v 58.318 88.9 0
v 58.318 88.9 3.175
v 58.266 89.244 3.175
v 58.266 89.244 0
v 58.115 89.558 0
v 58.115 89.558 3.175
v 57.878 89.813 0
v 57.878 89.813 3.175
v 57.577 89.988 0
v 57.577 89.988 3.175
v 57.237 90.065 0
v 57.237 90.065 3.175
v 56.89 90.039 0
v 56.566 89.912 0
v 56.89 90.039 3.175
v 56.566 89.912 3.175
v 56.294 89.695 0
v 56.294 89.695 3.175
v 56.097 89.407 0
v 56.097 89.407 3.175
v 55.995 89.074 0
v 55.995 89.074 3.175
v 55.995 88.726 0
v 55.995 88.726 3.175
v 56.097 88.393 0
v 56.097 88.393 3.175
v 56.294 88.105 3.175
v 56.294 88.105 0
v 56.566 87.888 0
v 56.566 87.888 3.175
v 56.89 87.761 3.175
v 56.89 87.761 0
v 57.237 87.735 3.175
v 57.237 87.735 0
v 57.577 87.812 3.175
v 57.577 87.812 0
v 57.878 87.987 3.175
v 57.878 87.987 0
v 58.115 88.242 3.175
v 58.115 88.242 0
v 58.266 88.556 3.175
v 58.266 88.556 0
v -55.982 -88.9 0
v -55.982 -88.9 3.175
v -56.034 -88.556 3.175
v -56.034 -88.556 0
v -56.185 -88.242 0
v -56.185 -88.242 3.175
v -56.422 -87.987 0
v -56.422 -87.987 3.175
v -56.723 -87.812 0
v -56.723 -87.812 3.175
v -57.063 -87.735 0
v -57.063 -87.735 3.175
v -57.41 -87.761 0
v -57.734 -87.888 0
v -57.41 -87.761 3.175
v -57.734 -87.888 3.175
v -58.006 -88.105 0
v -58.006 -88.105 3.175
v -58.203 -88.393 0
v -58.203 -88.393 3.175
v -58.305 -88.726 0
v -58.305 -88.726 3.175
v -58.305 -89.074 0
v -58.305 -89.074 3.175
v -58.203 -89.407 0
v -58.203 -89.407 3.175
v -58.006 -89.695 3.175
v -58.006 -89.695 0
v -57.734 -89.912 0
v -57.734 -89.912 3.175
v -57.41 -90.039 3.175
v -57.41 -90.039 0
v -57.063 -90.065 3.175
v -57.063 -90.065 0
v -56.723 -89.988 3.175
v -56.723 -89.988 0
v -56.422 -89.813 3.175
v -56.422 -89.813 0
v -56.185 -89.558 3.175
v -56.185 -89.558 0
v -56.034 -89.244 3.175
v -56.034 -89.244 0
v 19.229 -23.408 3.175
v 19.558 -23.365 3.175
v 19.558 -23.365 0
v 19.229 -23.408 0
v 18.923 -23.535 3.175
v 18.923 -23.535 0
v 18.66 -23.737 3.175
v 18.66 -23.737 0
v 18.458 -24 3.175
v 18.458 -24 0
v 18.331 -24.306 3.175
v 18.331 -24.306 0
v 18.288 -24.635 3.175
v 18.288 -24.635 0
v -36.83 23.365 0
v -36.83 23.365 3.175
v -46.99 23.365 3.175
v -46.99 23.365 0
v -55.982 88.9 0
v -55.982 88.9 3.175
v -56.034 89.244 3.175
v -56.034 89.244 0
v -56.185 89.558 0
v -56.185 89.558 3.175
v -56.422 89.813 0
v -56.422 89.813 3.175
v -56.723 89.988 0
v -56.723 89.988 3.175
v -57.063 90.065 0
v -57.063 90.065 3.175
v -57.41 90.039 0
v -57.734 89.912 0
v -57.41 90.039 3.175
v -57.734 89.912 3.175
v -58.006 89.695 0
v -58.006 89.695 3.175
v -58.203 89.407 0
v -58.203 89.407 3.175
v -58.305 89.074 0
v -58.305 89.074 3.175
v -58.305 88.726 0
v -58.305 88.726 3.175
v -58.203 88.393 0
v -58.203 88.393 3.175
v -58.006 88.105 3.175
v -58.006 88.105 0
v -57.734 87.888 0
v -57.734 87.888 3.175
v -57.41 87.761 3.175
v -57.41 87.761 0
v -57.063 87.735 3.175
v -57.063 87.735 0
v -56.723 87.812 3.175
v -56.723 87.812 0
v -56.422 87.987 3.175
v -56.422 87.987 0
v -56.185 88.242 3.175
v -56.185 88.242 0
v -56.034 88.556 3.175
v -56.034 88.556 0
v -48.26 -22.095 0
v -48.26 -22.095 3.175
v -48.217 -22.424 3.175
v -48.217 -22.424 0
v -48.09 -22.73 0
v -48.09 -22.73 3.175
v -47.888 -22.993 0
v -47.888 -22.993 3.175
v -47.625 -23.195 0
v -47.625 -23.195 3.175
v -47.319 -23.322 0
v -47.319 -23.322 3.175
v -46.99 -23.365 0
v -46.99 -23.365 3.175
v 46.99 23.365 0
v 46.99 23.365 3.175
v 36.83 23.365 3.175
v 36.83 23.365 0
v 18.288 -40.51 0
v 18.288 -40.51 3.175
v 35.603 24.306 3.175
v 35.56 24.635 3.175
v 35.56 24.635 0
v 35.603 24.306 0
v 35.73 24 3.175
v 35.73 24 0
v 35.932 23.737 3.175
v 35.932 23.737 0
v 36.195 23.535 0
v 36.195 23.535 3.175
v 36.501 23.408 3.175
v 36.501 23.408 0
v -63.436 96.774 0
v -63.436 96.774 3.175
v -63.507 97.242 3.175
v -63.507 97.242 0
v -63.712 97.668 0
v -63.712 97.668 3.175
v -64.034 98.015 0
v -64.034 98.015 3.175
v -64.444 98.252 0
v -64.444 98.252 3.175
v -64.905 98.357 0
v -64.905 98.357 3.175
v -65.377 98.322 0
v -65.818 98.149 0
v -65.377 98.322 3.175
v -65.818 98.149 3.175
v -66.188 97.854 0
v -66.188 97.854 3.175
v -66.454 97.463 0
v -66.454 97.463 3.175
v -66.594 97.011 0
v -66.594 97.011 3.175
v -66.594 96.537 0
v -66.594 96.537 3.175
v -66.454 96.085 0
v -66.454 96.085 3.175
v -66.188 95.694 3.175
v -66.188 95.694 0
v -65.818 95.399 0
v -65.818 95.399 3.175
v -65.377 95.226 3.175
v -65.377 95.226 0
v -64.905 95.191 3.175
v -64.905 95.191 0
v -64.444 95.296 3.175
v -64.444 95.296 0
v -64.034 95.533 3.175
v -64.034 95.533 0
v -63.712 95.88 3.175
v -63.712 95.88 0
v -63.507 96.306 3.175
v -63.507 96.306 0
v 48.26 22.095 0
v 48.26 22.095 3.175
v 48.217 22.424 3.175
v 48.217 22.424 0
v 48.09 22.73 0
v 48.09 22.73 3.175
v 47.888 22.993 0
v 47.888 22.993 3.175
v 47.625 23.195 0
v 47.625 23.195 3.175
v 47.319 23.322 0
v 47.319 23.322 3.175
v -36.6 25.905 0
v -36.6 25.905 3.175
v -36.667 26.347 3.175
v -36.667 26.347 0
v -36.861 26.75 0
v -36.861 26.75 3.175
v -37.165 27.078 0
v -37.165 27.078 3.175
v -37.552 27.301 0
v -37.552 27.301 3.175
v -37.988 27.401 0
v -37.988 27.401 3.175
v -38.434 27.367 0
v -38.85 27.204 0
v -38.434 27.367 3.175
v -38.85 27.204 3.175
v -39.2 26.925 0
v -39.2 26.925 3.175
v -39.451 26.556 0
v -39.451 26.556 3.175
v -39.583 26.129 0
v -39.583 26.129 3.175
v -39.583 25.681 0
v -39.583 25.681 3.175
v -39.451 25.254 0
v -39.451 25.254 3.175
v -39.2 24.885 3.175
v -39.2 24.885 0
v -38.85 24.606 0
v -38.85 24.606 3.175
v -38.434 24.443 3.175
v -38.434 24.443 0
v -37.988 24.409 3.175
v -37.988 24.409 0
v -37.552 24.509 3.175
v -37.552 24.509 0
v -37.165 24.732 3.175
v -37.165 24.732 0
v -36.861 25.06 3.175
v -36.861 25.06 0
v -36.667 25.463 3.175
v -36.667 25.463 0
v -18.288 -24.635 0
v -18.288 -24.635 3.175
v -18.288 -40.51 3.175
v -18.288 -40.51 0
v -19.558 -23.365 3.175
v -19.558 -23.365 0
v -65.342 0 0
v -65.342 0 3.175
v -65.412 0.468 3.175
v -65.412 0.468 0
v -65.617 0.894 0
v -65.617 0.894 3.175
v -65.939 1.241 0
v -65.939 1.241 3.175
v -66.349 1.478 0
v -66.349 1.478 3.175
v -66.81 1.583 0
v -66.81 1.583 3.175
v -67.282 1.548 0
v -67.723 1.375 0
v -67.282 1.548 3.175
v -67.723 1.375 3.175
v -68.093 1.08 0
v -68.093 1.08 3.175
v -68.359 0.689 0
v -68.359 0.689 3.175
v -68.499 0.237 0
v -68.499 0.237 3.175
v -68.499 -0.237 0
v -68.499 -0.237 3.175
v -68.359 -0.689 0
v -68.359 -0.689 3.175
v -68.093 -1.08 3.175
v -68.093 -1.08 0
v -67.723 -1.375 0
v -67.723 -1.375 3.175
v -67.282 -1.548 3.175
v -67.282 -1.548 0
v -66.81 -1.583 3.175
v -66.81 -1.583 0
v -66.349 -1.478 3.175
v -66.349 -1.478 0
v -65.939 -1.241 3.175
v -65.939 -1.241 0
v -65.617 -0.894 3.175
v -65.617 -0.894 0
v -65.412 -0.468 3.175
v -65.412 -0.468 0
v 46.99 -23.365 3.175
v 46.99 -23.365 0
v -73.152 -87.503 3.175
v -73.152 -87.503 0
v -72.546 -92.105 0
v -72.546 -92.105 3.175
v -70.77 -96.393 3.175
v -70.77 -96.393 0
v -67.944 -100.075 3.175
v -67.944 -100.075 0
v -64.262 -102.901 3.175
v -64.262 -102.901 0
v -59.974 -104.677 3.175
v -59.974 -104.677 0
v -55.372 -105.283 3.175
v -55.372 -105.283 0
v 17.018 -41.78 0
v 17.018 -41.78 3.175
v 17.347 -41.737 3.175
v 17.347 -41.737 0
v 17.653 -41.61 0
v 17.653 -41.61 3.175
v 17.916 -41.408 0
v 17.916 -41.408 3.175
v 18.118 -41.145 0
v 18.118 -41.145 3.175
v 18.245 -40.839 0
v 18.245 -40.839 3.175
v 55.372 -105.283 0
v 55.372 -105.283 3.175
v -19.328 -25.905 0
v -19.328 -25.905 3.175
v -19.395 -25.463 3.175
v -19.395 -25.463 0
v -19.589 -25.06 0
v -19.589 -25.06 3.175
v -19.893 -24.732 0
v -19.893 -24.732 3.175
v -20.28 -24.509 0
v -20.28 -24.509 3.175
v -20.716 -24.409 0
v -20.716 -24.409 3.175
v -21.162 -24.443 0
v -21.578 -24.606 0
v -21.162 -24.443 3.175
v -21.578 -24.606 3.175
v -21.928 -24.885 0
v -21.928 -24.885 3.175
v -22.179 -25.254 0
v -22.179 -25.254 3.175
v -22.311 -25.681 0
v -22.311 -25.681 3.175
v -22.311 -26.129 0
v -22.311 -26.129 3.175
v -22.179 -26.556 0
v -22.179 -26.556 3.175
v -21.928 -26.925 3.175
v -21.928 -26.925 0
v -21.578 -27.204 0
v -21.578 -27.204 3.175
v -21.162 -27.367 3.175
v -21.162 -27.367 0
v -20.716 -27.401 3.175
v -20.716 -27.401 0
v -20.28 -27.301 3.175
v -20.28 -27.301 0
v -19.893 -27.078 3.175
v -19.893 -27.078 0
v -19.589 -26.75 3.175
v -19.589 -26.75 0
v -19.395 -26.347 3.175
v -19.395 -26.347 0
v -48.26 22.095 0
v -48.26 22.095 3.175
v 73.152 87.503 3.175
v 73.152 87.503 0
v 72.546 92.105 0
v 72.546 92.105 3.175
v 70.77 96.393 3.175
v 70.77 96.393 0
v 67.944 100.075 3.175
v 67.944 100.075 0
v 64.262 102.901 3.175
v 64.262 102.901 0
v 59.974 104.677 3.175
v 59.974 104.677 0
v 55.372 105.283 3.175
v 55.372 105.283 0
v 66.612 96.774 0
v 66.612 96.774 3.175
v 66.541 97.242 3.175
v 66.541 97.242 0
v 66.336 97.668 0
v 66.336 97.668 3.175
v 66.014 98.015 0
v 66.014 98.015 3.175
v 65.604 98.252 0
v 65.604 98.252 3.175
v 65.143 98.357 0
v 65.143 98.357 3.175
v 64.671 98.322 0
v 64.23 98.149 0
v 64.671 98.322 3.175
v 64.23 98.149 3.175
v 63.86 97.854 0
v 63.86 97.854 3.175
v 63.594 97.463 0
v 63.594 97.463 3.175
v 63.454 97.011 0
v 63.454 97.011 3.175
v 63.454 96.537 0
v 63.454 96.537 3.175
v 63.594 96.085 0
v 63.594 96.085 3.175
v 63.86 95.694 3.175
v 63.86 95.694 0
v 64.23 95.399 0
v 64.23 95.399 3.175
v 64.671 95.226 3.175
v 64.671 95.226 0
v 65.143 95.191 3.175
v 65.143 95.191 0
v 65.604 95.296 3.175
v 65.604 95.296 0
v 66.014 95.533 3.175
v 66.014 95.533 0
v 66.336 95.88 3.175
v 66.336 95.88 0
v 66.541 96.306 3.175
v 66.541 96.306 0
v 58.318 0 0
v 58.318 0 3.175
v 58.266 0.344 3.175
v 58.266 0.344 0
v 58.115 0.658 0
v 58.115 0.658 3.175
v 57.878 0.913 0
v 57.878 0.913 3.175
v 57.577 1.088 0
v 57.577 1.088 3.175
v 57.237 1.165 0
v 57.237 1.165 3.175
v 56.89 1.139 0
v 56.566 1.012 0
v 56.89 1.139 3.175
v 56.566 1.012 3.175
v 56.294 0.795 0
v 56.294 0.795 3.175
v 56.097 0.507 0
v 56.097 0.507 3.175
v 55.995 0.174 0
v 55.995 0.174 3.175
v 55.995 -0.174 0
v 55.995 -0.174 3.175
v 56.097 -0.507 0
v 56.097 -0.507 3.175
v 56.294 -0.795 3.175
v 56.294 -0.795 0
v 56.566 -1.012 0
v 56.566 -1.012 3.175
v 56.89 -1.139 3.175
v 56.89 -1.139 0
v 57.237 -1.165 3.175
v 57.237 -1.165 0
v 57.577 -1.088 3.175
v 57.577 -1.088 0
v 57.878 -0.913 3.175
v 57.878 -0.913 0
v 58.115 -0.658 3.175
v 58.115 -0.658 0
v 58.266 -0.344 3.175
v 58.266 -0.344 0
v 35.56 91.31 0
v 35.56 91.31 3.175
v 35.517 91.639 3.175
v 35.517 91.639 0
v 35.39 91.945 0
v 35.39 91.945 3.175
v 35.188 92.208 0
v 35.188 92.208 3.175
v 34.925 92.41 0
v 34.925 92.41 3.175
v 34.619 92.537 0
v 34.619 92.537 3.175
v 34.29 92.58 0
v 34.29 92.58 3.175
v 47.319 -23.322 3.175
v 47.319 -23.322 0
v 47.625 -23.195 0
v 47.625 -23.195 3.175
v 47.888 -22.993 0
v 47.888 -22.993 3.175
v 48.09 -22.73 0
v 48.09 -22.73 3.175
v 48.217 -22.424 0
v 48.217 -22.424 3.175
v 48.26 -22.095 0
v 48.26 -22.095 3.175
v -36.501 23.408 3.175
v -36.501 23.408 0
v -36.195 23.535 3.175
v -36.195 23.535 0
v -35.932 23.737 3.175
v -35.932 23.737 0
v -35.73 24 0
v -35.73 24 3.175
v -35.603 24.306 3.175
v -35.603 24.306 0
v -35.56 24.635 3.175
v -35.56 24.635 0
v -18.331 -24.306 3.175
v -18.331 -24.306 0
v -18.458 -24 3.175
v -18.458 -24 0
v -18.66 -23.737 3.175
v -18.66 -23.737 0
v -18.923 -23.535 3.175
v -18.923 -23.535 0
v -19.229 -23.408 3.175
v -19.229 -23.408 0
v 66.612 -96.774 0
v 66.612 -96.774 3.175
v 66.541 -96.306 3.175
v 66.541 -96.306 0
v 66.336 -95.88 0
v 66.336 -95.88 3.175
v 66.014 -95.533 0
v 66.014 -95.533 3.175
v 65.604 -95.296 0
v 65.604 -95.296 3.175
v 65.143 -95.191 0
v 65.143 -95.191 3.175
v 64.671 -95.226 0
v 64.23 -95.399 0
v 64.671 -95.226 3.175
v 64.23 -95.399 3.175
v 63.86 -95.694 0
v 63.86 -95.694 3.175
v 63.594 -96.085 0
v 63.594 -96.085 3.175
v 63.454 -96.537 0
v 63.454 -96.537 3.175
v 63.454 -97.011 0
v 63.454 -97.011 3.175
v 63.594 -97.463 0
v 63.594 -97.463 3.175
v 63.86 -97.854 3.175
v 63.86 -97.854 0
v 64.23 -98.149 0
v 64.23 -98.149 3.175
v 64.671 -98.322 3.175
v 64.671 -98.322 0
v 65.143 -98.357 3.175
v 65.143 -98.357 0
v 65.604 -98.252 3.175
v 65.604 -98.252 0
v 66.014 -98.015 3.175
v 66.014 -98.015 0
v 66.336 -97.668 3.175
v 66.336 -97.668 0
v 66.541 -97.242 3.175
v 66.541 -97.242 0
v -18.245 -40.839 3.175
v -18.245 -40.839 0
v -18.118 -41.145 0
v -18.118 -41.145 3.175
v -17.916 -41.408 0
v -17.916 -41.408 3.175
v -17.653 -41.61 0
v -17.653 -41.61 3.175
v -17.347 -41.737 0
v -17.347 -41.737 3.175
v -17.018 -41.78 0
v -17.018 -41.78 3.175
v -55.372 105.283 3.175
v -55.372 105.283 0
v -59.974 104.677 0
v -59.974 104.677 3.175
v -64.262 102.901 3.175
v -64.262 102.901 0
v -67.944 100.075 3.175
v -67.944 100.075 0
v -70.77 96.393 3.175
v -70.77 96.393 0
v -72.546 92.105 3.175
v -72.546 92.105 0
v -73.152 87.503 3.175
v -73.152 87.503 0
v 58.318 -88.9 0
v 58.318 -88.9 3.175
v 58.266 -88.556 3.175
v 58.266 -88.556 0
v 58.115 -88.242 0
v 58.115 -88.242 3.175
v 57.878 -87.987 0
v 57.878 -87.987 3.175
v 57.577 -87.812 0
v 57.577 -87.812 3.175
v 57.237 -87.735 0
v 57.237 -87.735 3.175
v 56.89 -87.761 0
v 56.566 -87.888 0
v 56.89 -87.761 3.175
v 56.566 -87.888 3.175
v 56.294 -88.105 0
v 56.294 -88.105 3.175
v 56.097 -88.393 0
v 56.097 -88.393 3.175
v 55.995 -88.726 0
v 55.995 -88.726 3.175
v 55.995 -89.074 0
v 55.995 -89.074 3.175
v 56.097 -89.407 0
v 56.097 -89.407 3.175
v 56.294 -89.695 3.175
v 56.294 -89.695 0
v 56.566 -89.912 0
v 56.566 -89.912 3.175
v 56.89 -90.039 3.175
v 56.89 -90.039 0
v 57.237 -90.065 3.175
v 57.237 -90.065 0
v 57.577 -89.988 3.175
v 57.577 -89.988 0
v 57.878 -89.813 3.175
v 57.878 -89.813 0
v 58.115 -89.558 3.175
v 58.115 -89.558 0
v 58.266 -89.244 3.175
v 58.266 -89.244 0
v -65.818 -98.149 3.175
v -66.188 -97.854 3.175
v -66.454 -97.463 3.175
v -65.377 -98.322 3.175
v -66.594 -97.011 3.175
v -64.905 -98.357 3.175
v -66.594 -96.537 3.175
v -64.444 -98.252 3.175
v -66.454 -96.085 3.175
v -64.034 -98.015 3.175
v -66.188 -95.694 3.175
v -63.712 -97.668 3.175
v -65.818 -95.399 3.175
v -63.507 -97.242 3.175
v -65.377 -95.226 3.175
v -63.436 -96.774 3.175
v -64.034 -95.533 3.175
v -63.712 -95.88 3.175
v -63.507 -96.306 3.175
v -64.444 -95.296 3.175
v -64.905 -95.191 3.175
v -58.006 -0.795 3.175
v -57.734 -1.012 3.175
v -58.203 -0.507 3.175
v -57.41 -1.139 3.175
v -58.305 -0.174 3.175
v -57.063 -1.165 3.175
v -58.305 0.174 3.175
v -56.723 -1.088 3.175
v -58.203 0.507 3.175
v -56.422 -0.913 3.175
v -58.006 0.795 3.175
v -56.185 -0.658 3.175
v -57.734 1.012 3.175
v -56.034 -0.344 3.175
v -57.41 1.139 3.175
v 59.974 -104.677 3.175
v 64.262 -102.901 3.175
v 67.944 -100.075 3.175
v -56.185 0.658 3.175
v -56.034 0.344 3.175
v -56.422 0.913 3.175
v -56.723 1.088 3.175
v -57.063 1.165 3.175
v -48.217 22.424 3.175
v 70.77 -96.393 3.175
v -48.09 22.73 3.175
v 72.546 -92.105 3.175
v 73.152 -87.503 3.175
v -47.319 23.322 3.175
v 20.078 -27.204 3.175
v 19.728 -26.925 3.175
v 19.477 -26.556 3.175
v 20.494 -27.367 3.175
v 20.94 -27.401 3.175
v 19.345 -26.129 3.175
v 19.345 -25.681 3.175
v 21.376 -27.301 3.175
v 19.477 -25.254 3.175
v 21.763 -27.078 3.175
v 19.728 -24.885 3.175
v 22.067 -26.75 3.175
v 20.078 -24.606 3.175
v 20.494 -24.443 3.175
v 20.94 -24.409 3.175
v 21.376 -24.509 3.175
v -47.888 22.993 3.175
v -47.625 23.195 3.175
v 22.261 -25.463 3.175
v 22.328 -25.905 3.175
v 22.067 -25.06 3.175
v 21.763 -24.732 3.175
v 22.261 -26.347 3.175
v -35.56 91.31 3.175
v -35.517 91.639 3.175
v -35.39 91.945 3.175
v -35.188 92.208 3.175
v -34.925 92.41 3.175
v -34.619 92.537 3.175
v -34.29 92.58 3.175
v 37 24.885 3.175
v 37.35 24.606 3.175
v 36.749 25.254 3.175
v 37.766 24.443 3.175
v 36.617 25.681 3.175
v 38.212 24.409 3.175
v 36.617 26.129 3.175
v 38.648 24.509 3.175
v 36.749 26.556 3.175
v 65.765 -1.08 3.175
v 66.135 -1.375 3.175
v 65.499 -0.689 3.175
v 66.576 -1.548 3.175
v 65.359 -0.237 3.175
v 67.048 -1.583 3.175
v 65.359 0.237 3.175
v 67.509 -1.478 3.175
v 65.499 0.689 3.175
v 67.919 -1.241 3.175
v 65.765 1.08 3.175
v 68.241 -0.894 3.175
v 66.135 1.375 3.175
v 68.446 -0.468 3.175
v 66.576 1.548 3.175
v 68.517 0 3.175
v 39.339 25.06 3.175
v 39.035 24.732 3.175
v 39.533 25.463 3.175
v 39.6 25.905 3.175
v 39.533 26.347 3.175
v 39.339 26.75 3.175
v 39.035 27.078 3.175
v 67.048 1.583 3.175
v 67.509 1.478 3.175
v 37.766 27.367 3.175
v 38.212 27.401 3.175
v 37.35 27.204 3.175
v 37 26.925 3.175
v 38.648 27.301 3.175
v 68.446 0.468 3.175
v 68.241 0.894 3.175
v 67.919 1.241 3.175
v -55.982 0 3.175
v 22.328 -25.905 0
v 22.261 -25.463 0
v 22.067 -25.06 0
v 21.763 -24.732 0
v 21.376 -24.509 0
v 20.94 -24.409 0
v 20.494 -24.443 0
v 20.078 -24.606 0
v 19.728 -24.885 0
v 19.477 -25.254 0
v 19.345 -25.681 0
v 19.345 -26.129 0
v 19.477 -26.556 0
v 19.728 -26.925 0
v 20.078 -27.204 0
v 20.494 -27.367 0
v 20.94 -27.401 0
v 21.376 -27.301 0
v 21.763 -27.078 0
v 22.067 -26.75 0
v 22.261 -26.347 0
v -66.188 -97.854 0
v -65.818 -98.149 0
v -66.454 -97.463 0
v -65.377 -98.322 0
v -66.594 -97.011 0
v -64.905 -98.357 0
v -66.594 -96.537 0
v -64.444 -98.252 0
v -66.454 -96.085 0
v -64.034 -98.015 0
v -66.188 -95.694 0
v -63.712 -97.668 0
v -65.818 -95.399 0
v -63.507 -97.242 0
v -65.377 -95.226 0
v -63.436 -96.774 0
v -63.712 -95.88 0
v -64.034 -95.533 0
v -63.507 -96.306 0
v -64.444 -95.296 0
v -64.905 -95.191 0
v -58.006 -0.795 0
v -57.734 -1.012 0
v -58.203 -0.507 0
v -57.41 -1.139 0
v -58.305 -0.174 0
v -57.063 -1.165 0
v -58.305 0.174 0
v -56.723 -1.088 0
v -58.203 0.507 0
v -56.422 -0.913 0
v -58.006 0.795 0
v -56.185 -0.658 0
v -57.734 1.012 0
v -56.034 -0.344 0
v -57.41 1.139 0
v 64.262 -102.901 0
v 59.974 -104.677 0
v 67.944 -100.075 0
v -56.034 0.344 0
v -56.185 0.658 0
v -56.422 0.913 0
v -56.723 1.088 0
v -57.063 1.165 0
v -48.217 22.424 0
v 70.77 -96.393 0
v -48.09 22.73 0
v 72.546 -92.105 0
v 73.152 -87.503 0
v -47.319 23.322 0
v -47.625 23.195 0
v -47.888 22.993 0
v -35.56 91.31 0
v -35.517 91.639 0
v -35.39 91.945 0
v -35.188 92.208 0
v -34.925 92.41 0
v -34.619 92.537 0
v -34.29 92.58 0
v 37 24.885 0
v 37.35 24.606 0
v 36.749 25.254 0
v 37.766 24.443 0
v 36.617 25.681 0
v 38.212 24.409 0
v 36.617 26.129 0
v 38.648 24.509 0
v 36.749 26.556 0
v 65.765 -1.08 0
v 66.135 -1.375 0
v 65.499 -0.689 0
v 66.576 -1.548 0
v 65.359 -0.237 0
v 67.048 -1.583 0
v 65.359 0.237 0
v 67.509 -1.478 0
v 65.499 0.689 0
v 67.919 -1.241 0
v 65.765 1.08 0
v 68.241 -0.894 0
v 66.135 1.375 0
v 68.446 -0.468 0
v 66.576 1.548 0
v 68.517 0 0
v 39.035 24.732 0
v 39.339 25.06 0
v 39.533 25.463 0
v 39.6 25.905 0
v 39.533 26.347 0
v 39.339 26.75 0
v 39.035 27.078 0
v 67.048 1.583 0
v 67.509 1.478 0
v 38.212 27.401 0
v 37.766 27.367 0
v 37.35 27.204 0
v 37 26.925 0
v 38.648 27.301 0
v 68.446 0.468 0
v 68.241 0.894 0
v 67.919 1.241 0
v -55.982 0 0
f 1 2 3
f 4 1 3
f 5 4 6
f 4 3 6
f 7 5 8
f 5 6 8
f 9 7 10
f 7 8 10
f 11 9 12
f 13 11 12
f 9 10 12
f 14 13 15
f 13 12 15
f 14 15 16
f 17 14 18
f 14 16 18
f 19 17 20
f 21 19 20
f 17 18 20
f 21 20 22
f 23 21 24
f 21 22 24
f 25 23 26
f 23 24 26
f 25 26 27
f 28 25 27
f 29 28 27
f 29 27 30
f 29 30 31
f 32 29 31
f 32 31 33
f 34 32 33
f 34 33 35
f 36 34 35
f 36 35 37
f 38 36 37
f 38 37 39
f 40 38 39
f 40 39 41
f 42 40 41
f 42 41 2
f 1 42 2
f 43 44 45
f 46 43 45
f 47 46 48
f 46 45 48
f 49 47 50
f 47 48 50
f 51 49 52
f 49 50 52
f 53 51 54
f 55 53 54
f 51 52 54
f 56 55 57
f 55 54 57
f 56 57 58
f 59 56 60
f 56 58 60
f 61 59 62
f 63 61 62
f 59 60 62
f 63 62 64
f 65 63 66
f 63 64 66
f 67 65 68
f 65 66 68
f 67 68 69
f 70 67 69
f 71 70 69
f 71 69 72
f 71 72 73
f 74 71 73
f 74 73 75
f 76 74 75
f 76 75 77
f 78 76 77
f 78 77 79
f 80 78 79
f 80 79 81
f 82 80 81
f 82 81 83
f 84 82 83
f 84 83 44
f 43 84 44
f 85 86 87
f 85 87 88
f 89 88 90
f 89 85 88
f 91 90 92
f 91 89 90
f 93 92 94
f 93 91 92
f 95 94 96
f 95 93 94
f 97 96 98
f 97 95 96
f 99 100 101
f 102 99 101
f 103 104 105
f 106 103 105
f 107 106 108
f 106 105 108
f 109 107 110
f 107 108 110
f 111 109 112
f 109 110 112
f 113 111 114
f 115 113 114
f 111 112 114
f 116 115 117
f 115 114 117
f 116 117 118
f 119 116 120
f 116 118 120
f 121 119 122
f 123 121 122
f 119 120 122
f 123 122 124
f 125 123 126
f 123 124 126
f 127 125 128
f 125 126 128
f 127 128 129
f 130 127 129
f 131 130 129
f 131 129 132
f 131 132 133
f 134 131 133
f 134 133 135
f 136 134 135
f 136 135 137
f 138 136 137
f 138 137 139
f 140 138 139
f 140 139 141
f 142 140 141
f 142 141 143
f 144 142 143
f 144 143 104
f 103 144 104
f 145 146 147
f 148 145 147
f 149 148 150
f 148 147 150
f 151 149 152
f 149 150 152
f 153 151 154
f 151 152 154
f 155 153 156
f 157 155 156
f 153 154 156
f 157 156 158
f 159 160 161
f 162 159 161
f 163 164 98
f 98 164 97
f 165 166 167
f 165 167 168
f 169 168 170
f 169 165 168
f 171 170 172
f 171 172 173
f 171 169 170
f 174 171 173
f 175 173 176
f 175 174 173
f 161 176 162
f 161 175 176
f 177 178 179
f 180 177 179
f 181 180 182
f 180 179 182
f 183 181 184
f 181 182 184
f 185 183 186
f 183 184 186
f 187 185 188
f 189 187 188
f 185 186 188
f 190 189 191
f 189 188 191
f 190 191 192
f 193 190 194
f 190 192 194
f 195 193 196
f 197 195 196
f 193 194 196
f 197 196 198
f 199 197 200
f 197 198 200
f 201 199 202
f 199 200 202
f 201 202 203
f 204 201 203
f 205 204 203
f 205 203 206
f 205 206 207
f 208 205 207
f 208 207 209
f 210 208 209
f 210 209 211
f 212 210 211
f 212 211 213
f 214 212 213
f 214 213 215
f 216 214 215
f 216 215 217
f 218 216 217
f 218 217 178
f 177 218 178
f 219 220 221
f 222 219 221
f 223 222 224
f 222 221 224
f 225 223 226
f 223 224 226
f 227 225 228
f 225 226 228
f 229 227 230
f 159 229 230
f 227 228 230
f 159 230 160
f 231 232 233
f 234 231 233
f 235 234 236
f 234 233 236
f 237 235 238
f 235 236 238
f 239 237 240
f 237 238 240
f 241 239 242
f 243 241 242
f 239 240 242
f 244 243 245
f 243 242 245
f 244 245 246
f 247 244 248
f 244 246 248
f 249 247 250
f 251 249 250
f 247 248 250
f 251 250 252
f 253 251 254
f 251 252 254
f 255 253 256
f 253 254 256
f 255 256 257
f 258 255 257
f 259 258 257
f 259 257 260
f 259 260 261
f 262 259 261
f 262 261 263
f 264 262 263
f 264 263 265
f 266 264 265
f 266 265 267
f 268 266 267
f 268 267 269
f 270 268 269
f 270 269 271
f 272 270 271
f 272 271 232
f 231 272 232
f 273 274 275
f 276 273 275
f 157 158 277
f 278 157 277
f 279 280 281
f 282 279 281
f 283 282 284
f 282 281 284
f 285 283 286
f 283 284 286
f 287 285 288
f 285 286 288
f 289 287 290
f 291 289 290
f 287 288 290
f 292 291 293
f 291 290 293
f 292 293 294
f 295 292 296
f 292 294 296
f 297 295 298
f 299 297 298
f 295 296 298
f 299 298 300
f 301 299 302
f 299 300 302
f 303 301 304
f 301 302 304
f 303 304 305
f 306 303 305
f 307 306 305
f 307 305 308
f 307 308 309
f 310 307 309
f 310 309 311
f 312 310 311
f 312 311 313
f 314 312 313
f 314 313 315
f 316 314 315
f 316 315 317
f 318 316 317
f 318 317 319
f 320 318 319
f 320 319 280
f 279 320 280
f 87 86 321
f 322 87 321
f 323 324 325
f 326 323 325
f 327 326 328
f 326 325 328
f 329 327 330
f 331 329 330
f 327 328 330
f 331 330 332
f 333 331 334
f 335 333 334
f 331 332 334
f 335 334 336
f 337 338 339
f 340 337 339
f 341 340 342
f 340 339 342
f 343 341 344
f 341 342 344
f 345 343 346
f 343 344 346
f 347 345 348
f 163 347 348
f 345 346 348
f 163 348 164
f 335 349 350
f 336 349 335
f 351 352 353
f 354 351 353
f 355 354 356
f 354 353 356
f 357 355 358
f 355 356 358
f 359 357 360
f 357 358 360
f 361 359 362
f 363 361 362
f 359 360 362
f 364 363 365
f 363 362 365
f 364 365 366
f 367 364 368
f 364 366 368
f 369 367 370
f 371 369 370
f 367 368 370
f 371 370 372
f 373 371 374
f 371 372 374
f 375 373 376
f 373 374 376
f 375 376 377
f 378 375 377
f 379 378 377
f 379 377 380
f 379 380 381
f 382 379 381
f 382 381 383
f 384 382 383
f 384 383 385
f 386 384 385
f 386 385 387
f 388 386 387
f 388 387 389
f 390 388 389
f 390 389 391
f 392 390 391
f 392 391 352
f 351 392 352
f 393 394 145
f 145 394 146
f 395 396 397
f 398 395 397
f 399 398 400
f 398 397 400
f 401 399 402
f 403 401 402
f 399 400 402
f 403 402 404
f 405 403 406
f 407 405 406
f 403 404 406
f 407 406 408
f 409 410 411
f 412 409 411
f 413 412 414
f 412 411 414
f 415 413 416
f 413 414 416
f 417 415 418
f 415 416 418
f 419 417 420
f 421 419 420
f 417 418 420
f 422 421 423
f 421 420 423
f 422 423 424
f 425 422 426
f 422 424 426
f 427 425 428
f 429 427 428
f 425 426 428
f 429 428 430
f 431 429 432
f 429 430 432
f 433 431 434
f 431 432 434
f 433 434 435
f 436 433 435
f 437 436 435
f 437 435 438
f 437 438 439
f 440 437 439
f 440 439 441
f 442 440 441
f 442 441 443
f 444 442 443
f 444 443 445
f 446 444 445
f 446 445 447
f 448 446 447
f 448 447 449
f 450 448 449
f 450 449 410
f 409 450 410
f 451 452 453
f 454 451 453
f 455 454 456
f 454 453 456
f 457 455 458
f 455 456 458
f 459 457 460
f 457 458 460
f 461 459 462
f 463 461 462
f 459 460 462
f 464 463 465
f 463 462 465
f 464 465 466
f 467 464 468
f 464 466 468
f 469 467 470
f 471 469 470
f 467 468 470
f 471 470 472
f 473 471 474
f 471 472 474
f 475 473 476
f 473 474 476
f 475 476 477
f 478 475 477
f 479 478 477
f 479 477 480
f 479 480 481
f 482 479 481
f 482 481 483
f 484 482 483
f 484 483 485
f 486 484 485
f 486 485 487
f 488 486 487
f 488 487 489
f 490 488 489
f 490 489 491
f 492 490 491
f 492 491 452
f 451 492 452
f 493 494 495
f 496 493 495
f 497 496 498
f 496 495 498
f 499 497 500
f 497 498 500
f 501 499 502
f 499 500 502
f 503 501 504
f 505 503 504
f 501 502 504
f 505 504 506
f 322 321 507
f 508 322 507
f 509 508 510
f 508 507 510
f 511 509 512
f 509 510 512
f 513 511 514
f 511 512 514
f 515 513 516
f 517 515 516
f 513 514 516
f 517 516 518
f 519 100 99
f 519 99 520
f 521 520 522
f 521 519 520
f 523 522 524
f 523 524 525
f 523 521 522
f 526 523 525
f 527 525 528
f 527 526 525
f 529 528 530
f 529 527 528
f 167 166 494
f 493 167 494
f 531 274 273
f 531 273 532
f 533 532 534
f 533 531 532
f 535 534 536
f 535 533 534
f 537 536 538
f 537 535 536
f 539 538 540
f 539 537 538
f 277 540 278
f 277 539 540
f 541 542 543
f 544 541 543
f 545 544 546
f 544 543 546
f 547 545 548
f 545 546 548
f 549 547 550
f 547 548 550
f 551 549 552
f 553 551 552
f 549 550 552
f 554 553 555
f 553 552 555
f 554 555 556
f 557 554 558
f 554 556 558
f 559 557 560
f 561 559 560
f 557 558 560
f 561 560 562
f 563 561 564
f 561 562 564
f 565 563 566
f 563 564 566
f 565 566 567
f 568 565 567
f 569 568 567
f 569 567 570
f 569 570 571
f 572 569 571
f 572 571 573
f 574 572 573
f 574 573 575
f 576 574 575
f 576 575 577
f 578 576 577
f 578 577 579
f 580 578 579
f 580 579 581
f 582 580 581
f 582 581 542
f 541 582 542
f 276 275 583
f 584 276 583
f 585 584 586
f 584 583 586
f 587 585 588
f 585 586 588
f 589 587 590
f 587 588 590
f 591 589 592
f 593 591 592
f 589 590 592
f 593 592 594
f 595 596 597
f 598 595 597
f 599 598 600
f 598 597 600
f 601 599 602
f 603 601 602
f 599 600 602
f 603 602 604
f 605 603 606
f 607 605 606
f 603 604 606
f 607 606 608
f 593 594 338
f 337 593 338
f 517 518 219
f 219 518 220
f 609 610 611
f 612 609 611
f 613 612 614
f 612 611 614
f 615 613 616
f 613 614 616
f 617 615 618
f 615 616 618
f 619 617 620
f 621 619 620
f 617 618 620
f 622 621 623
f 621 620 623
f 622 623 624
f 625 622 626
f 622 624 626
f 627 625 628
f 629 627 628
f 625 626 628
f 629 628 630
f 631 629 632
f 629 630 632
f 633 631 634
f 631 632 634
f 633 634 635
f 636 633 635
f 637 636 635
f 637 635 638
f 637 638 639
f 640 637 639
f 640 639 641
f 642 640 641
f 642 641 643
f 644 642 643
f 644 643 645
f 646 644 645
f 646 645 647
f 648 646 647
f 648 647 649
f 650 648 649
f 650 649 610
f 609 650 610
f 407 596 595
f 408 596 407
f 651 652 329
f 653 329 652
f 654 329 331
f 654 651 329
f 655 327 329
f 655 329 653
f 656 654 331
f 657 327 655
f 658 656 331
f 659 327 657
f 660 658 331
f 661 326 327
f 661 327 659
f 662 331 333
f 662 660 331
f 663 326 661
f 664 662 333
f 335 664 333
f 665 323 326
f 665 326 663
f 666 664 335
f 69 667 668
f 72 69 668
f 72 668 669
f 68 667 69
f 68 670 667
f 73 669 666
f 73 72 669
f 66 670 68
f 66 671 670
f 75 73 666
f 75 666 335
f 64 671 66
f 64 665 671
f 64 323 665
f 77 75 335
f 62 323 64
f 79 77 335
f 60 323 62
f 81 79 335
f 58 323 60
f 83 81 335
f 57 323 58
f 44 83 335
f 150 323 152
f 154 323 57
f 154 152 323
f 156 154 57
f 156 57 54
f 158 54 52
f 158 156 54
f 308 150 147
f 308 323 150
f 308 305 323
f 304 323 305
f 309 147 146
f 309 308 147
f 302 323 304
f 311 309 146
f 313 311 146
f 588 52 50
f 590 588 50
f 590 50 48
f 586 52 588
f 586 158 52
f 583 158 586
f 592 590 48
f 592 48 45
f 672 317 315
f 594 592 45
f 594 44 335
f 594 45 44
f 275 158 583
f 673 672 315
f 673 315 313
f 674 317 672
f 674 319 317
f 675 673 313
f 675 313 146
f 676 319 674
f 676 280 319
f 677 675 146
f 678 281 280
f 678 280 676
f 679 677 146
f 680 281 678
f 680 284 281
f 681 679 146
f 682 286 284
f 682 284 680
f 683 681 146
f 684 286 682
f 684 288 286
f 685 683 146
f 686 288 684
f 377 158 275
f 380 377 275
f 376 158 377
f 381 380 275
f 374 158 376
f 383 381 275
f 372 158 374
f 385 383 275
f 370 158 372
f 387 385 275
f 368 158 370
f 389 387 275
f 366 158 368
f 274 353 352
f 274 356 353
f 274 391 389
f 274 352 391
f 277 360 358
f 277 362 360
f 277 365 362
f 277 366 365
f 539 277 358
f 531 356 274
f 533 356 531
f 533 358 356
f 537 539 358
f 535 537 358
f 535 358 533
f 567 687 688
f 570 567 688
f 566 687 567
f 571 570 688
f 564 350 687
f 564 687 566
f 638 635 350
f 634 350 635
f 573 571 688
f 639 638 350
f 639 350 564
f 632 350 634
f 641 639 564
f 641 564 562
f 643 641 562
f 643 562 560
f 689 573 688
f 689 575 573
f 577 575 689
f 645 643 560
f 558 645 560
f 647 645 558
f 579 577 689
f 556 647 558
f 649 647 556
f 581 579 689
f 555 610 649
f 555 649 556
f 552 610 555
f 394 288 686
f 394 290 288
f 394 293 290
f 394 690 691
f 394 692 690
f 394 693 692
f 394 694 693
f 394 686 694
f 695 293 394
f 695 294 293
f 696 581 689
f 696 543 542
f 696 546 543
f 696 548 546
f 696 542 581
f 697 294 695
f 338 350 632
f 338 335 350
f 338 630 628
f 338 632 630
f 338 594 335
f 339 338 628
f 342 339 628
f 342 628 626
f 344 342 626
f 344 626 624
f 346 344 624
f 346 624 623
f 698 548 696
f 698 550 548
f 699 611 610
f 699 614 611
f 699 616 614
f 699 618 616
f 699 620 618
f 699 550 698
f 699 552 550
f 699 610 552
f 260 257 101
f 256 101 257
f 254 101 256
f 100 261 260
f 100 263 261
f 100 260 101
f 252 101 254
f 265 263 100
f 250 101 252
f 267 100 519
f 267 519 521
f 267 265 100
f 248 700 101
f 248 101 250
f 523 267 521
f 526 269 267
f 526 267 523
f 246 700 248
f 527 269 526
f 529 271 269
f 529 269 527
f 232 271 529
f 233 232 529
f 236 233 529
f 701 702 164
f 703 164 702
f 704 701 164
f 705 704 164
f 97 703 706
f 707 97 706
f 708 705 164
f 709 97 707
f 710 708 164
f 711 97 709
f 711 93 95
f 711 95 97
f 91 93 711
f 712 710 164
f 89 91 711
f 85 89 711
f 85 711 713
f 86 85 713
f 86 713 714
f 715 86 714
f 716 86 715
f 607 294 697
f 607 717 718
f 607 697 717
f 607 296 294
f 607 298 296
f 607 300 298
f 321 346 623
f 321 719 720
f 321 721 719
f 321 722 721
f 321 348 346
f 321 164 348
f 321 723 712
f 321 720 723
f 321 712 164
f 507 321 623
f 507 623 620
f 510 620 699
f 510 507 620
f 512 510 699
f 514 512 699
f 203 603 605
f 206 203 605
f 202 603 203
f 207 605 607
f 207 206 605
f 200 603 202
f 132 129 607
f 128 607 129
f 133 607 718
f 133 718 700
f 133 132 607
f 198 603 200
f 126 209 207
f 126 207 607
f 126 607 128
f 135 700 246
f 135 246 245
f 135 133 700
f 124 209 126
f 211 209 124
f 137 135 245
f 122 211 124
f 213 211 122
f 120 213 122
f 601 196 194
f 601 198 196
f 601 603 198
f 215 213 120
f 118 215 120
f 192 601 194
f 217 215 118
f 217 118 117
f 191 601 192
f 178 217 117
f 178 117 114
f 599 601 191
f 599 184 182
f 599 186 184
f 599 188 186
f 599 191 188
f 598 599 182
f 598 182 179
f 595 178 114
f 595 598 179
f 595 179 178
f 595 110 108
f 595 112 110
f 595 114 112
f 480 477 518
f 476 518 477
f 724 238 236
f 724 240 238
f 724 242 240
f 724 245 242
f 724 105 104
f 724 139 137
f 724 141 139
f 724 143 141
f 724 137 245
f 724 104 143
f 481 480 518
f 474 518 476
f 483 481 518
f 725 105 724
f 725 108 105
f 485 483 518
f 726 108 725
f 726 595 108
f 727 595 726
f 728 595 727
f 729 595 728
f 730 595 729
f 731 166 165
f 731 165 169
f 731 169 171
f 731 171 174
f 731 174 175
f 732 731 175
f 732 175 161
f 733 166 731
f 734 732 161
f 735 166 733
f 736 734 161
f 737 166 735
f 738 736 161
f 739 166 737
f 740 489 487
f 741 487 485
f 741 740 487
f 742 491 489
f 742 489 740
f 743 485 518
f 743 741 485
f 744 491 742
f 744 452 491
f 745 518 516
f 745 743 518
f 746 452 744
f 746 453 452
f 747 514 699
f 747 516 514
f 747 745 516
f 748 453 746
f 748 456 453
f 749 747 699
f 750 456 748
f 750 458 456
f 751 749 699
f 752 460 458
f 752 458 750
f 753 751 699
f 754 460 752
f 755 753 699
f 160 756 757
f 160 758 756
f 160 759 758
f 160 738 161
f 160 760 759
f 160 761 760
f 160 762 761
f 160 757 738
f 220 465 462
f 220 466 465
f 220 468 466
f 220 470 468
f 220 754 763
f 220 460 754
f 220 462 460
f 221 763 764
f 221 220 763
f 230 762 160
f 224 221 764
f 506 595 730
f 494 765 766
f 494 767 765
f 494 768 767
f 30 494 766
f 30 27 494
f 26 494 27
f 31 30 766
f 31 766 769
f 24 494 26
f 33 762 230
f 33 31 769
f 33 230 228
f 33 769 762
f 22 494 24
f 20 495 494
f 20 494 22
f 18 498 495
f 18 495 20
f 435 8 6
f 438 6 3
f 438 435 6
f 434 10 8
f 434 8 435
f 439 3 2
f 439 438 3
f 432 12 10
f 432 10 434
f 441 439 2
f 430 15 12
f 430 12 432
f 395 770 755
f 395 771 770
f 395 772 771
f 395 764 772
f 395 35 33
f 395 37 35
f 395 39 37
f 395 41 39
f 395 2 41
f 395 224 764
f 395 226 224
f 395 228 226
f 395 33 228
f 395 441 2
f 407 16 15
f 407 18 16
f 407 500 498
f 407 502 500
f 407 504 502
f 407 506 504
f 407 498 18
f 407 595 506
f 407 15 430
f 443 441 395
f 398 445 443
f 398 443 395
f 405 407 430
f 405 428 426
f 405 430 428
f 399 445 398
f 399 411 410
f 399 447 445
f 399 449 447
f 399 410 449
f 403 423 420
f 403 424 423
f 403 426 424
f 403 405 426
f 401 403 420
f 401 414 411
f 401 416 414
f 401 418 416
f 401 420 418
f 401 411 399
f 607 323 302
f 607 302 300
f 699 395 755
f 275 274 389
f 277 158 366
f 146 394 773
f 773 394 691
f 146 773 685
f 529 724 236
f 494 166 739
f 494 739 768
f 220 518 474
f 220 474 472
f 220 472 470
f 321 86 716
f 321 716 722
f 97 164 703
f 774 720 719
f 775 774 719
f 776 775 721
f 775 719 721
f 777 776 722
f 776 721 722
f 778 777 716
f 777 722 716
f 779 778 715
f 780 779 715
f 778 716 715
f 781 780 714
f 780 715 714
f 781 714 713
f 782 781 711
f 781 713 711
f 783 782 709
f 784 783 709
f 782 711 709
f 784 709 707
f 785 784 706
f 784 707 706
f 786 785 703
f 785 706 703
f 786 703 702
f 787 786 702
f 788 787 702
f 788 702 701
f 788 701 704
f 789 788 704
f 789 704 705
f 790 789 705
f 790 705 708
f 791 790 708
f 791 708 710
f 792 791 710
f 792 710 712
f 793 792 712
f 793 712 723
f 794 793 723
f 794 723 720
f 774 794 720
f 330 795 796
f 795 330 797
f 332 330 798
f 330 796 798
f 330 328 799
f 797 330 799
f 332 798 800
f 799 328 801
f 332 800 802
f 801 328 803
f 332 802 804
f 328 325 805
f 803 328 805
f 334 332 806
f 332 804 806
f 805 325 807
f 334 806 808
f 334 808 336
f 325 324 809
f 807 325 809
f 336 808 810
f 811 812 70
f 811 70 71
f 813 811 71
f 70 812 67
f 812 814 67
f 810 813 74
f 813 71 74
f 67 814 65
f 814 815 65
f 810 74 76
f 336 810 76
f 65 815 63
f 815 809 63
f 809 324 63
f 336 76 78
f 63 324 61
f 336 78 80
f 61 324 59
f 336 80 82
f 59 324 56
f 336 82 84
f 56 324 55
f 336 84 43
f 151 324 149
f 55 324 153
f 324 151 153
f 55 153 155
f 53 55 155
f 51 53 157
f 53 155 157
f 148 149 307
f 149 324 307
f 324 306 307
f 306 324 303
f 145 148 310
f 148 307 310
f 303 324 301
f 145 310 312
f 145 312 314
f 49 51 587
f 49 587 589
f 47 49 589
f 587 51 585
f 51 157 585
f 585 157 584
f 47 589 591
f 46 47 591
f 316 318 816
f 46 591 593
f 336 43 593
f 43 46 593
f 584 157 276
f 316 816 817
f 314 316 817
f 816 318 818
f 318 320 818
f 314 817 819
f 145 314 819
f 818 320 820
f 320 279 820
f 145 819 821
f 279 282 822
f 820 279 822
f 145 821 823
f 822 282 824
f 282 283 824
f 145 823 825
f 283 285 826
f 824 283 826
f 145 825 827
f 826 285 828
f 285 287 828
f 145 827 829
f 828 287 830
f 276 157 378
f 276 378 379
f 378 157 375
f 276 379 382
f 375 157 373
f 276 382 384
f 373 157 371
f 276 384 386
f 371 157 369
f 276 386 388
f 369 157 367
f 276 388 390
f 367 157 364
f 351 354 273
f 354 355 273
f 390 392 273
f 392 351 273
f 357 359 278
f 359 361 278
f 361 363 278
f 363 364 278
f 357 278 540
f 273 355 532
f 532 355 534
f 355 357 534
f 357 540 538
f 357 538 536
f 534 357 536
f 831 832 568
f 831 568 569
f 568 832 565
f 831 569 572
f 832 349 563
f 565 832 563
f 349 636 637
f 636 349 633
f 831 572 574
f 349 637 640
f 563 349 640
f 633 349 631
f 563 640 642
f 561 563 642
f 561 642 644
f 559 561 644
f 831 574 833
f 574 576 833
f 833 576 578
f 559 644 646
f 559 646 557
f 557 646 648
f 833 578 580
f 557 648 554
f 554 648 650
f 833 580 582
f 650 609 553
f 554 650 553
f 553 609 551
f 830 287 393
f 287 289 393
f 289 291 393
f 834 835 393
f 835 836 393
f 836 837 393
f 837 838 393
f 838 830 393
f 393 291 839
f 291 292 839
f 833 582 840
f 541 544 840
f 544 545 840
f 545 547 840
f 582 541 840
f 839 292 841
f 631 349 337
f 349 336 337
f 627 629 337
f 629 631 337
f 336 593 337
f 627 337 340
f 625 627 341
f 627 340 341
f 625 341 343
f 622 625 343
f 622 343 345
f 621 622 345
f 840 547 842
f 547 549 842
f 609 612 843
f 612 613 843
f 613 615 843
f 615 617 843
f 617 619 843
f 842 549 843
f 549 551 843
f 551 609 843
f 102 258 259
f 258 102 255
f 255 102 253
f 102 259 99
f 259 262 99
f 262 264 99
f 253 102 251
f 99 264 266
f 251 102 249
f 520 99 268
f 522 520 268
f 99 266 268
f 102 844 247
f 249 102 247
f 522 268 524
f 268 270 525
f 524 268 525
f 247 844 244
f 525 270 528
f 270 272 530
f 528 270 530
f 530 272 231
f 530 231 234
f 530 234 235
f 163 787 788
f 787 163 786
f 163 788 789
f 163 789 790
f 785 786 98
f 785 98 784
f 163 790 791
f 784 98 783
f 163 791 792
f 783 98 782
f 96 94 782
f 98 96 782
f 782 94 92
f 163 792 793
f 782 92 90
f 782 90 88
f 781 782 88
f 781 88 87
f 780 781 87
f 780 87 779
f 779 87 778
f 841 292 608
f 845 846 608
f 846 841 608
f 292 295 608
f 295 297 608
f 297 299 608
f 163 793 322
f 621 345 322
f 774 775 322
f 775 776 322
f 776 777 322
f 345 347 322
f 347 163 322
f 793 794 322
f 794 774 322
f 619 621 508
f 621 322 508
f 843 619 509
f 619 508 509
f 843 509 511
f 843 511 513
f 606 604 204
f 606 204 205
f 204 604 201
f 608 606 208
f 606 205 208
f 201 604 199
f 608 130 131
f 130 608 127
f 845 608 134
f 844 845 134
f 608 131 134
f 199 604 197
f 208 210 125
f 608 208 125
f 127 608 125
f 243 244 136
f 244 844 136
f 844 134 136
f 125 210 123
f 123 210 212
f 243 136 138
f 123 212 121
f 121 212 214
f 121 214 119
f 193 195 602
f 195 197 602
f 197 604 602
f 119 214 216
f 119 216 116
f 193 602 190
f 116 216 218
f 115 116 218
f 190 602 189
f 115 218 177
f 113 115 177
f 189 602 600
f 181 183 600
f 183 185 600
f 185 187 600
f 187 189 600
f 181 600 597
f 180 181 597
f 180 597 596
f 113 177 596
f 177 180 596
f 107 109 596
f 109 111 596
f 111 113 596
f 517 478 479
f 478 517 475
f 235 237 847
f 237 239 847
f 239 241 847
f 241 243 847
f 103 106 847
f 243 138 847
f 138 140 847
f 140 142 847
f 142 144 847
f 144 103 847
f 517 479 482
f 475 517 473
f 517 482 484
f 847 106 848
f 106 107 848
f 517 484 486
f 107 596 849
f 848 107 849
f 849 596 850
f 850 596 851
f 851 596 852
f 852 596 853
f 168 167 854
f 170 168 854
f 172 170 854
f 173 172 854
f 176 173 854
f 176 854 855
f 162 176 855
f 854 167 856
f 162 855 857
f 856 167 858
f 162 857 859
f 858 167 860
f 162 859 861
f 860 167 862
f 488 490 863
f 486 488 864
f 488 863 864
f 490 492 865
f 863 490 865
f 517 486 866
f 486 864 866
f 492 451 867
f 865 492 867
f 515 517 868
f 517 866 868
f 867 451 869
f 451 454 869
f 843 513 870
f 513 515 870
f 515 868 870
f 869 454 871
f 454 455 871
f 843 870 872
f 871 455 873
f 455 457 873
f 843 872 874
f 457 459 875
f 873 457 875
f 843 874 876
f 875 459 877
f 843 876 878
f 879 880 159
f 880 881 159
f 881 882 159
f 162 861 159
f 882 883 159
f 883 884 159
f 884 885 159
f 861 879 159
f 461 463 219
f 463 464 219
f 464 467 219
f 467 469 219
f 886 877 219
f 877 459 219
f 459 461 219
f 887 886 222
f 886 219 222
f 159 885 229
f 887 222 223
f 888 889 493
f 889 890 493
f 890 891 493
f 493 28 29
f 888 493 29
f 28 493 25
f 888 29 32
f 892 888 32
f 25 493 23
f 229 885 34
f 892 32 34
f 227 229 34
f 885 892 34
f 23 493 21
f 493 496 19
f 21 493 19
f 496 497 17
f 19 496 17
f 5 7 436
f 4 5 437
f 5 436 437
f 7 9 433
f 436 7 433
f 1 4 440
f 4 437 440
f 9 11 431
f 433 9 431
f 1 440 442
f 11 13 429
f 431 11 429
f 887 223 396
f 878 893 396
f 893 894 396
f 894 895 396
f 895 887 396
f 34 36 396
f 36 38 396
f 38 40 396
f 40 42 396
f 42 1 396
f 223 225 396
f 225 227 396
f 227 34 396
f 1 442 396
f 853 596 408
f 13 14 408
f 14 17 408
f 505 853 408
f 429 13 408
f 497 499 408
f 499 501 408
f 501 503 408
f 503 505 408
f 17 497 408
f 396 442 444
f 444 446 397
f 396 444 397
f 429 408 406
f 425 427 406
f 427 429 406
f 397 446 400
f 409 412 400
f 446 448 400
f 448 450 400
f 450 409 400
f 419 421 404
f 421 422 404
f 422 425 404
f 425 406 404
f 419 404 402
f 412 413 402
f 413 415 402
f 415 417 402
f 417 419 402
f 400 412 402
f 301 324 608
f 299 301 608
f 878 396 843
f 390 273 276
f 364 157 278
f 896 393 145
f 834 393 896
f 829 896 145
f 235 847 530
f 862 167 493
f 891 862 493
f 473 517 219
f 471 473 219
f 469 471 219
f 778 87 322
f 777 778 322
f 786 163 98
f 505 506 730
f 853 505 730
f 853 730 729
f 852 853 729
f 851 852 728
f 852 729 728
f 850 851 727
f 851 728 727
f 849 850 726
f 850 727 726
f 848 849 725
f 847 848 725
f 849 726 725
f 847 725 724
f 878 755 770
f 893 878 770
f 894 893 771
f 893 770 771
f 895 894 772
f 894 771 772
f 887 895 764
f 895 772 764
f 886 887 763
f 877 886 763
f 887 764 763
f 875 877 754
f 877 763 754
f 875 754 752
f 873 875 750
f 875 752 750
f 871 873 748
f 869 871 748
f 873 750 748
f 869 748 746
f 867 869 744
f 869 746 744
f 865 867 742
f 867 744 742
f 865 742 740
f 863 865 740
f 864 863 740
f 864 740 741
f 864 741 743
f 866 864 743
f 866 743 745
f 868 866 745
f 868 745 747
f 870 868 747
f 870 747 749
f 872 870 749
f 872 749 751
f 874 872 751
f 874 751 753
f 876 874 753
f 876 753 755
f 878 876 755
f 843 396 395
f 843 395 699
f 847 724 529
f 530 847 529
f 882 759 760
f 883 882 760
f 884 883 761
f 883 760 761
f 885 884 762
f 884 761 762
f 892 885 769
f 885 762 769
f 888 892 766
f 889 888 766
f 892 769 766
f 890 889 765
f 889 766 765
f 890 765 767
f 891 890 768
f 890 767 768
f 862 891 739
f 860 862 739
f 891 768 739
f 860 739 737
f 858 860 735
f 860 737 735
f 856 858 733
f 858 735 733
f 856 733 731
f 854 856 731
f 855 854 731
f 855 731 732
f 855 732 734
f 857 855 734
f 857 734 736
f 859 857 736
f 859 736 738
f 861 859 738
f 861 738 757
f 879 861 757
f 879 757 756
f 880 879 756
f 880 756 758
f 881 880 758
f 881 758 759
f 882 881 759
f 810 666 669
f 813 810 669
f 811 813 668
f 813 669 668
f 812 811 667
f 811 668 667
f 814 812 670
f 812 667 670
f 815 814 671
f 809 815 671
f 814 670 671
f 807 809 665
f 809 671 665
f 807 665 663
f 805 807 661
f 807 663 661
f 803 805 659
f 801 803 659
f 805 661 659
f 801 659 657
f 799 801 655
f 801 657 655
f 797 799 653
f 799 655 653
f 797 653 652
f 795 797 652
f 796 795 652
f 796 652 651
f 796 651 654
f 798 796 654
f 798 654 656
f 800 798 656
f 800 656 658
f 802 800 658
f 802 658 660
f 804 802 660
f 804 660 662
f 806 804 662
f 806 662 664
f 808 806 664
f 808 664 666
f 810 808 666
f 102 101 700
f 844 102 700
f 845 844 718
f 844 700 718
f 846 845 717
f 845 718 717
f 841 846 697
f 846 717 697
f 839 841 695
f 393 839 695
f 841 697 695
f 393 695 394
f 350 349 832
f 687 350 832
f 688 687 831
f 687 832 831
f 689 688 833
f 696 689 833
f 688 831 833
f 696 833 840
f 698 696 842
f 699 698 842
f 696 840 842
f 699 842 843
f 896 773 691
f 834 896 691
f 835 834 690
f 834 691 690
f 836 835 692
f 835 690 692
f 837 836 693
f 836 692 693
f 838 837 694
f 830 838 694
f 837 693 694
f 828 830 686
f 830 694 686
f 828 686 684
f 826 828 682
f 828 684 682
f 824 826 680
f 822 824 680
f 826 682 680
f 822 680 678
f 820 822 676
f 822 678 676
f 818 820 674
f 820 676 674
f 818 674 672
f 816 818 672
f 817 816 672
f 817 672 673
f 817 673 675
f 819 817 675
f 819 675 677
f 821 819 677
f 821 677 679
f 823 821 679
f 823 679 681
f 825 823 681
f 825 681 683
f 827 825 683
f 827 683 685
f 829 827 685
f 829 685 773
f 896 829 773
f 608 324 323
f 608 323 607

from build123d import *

# Parameters (mm, degrees)
PAD_DEPTH       = 3.175
SKETCH001_R     = 1.5875
POCKET_DEPTH    = 3.176
SKETCH002_R     = 1.5
POCKET001_DEPTH = 3.176
SKETCH003_R     = 1.1684
POCKET002_DEPTH = 3.176


with BuildPart() as part:
    # Sketch → Pad (new body)
    with BuildSketch(Plane.XY):
        with BuildLine():
            ThreePointArc((-55.372, 105.283), (-67.944359, 100.075359), (-73.152, 87.503))
            Line((-73.152, -87.503), (-73.152, 87.503))
            ThreePointArc((-73.152, -87.503), (-67.944359, -100.075359), (-55.372, -105.283))
            Line((55.372, -105.283), (-55.372, -105.283))
            ThreePointArc((55.372, -105.283), (67.944359, -100.075359), (73.152, -87.503))
            Line((73.152, 87.503), (73.152, -87.503))
            ThreePointArc((73.152, 87.503), (67.944359, 100.075359), (55.372, 105.283))
            Line((-55.372, 105.283), (55.372, 105.283))
        make_face()
    extrude(amount=PAD_DEPTH)

    # Sketch001 (on DatumPlane) → Pocket (cut, through all)
    with BuildSketch(Plane.XY.offset(3.175)):
        with Locations((-65.024, 96.774)):
            Circle(SKETCH001_R)
        with Locations((65.024, 96.774)):
            Circle(SKETCH001_R)
        with Locations((65.024, -96.774)):
            Circle(SKETCH001_R)
        with Locations((-65.024, -96.774)):
            Circle(SKETCH001_R)
        with Locations((-66.929, 0)):
            Circle(SKETCH001_R)
        with Locations((66.929, 0)):
            Circle(SKETCH001_R)
    extrude(amount=-POCKET_DEPTH, mode=Mode.SUBTRACT)

    # Sketch002 (on DatumPlane) → Pocket001 (cut, through all)
    with BuildSketch(Plane.XY.offset(3.175)):
        with Locations((-38.1, 25.905)):
            Circle(SKETCH002_R)
        with Locations((38.1, 25.905)):
            Circle(SKETCH002_R)
        with Locations((-20.828, -25.905)):
            Circle(SKETCH002_R)
        with Locations((20.828, -25.905)):
            Circle(SKETCH002_R)
        with BuildLine():
            Line((-18.288, -29.08), (-18.288, -40.51))
            ThreePointArc((-18.288, -40.51), (-17.916026, -41.408026), (-17.018, -41.78))
            Line((-17.018, -41.78), (17.018, -41.78))
            ThreePointArc((17.018, -41.78), (17.916026, -41.408026), (18.288, -40.51))
            Line((18.288, -40.51), (18.288, -29.08))
            Line((18.288, -29.08), (18.288, -24.635))
            ThreePointArc((19.558, -23.365), (18.659974, -23.736974), (18.288, -24.635))
            Line((19.558, -23.365), (46.99, -23.365))
            ThreePointArc((46.99, -23.365), (47.888026, -22.993026), (48.26, -22.095))
            Line((48.26, -22.095), (48.26, 22.095))
            ThreePointArc((48.26, 22.095), (47.888026, 22.993026), (46.99, 23.365))
            Line((46.99, 23.365), (36.83, 23.365))
            ThreePointArc((35.56, 24.635), (35.931974, 23.736974), (36.83, 23.365))
            Line((35.56, 24.635), (35.56, 29.08))
            Line((35.56, 29.08), (35.56, 91.31))
            ThreePointArc((35.56, 91.31), (35.188026, 92.208026), (34.29, 92.58))
            Line((34.29, 92.58), (-34.29, 92.58))
            ThreePointArc((-34.29, 92.58), (-35.188026, 92.208026), (-35.56, 91.31))
            Line((-35.56, 91.31), (-35.56, 29.08))
            Line((-35.56, 29.08), (-35.56, 24.635))
            ThreePointArc((-36.83, 23.365), (-35.931974, 23.736974), (-35.56, 24.635))
            Line((-36.83, 23.365), (-46.99, 23.365))
            ThreePointArc((-46.99, 23.365), (-47.888026, 22.993026), (-48.26, 22.095))
            Line((-48.26, 22.095), (-48.26, -22.095))
            ThreePointArc((-48.26, -22.095), (-47.888026, -22.993026), (-46.99, -23.365))
            Line((-46.99, -23.365), (-19.558, -23.365))
            ThreePointArc((-18.288, -24.635), (-18.659974, -23.736974), (-19.558, -23.365))
            Line((-18.288, -24.635), (-18.288, -29.08))
        make_face()
    extrude(amount=-POCKET001_DEPTH, mode=Mode.SUBTRACT)

    # Sketch003 (on DatumPlane) → Pocket002 (cut, through all)
    with BuildSketch(Plane.XY.offset(3.175)):
        with Locations((-57.15, 88.9)):
            Circle(SKETCH003_R)
        with Locations((57.15, 88.9)):
            Circle(SKETCH003_R)
        with Locations((57.15, 0)):
            Circle(SKETCH003_R)
        with Locations((57.15, -88.9)):
            Circle(SKETCH003_R)
        with Locations((-57.15, -88.9)):
            Circle(SKETCH003_R)
        with Locations((-57.15, 0)):
            Circle(SKETCH003_R)
    extrude(amount=-POCKET002_DEPTH, mode=Mode.SUBTRACT)


solid = part.part
